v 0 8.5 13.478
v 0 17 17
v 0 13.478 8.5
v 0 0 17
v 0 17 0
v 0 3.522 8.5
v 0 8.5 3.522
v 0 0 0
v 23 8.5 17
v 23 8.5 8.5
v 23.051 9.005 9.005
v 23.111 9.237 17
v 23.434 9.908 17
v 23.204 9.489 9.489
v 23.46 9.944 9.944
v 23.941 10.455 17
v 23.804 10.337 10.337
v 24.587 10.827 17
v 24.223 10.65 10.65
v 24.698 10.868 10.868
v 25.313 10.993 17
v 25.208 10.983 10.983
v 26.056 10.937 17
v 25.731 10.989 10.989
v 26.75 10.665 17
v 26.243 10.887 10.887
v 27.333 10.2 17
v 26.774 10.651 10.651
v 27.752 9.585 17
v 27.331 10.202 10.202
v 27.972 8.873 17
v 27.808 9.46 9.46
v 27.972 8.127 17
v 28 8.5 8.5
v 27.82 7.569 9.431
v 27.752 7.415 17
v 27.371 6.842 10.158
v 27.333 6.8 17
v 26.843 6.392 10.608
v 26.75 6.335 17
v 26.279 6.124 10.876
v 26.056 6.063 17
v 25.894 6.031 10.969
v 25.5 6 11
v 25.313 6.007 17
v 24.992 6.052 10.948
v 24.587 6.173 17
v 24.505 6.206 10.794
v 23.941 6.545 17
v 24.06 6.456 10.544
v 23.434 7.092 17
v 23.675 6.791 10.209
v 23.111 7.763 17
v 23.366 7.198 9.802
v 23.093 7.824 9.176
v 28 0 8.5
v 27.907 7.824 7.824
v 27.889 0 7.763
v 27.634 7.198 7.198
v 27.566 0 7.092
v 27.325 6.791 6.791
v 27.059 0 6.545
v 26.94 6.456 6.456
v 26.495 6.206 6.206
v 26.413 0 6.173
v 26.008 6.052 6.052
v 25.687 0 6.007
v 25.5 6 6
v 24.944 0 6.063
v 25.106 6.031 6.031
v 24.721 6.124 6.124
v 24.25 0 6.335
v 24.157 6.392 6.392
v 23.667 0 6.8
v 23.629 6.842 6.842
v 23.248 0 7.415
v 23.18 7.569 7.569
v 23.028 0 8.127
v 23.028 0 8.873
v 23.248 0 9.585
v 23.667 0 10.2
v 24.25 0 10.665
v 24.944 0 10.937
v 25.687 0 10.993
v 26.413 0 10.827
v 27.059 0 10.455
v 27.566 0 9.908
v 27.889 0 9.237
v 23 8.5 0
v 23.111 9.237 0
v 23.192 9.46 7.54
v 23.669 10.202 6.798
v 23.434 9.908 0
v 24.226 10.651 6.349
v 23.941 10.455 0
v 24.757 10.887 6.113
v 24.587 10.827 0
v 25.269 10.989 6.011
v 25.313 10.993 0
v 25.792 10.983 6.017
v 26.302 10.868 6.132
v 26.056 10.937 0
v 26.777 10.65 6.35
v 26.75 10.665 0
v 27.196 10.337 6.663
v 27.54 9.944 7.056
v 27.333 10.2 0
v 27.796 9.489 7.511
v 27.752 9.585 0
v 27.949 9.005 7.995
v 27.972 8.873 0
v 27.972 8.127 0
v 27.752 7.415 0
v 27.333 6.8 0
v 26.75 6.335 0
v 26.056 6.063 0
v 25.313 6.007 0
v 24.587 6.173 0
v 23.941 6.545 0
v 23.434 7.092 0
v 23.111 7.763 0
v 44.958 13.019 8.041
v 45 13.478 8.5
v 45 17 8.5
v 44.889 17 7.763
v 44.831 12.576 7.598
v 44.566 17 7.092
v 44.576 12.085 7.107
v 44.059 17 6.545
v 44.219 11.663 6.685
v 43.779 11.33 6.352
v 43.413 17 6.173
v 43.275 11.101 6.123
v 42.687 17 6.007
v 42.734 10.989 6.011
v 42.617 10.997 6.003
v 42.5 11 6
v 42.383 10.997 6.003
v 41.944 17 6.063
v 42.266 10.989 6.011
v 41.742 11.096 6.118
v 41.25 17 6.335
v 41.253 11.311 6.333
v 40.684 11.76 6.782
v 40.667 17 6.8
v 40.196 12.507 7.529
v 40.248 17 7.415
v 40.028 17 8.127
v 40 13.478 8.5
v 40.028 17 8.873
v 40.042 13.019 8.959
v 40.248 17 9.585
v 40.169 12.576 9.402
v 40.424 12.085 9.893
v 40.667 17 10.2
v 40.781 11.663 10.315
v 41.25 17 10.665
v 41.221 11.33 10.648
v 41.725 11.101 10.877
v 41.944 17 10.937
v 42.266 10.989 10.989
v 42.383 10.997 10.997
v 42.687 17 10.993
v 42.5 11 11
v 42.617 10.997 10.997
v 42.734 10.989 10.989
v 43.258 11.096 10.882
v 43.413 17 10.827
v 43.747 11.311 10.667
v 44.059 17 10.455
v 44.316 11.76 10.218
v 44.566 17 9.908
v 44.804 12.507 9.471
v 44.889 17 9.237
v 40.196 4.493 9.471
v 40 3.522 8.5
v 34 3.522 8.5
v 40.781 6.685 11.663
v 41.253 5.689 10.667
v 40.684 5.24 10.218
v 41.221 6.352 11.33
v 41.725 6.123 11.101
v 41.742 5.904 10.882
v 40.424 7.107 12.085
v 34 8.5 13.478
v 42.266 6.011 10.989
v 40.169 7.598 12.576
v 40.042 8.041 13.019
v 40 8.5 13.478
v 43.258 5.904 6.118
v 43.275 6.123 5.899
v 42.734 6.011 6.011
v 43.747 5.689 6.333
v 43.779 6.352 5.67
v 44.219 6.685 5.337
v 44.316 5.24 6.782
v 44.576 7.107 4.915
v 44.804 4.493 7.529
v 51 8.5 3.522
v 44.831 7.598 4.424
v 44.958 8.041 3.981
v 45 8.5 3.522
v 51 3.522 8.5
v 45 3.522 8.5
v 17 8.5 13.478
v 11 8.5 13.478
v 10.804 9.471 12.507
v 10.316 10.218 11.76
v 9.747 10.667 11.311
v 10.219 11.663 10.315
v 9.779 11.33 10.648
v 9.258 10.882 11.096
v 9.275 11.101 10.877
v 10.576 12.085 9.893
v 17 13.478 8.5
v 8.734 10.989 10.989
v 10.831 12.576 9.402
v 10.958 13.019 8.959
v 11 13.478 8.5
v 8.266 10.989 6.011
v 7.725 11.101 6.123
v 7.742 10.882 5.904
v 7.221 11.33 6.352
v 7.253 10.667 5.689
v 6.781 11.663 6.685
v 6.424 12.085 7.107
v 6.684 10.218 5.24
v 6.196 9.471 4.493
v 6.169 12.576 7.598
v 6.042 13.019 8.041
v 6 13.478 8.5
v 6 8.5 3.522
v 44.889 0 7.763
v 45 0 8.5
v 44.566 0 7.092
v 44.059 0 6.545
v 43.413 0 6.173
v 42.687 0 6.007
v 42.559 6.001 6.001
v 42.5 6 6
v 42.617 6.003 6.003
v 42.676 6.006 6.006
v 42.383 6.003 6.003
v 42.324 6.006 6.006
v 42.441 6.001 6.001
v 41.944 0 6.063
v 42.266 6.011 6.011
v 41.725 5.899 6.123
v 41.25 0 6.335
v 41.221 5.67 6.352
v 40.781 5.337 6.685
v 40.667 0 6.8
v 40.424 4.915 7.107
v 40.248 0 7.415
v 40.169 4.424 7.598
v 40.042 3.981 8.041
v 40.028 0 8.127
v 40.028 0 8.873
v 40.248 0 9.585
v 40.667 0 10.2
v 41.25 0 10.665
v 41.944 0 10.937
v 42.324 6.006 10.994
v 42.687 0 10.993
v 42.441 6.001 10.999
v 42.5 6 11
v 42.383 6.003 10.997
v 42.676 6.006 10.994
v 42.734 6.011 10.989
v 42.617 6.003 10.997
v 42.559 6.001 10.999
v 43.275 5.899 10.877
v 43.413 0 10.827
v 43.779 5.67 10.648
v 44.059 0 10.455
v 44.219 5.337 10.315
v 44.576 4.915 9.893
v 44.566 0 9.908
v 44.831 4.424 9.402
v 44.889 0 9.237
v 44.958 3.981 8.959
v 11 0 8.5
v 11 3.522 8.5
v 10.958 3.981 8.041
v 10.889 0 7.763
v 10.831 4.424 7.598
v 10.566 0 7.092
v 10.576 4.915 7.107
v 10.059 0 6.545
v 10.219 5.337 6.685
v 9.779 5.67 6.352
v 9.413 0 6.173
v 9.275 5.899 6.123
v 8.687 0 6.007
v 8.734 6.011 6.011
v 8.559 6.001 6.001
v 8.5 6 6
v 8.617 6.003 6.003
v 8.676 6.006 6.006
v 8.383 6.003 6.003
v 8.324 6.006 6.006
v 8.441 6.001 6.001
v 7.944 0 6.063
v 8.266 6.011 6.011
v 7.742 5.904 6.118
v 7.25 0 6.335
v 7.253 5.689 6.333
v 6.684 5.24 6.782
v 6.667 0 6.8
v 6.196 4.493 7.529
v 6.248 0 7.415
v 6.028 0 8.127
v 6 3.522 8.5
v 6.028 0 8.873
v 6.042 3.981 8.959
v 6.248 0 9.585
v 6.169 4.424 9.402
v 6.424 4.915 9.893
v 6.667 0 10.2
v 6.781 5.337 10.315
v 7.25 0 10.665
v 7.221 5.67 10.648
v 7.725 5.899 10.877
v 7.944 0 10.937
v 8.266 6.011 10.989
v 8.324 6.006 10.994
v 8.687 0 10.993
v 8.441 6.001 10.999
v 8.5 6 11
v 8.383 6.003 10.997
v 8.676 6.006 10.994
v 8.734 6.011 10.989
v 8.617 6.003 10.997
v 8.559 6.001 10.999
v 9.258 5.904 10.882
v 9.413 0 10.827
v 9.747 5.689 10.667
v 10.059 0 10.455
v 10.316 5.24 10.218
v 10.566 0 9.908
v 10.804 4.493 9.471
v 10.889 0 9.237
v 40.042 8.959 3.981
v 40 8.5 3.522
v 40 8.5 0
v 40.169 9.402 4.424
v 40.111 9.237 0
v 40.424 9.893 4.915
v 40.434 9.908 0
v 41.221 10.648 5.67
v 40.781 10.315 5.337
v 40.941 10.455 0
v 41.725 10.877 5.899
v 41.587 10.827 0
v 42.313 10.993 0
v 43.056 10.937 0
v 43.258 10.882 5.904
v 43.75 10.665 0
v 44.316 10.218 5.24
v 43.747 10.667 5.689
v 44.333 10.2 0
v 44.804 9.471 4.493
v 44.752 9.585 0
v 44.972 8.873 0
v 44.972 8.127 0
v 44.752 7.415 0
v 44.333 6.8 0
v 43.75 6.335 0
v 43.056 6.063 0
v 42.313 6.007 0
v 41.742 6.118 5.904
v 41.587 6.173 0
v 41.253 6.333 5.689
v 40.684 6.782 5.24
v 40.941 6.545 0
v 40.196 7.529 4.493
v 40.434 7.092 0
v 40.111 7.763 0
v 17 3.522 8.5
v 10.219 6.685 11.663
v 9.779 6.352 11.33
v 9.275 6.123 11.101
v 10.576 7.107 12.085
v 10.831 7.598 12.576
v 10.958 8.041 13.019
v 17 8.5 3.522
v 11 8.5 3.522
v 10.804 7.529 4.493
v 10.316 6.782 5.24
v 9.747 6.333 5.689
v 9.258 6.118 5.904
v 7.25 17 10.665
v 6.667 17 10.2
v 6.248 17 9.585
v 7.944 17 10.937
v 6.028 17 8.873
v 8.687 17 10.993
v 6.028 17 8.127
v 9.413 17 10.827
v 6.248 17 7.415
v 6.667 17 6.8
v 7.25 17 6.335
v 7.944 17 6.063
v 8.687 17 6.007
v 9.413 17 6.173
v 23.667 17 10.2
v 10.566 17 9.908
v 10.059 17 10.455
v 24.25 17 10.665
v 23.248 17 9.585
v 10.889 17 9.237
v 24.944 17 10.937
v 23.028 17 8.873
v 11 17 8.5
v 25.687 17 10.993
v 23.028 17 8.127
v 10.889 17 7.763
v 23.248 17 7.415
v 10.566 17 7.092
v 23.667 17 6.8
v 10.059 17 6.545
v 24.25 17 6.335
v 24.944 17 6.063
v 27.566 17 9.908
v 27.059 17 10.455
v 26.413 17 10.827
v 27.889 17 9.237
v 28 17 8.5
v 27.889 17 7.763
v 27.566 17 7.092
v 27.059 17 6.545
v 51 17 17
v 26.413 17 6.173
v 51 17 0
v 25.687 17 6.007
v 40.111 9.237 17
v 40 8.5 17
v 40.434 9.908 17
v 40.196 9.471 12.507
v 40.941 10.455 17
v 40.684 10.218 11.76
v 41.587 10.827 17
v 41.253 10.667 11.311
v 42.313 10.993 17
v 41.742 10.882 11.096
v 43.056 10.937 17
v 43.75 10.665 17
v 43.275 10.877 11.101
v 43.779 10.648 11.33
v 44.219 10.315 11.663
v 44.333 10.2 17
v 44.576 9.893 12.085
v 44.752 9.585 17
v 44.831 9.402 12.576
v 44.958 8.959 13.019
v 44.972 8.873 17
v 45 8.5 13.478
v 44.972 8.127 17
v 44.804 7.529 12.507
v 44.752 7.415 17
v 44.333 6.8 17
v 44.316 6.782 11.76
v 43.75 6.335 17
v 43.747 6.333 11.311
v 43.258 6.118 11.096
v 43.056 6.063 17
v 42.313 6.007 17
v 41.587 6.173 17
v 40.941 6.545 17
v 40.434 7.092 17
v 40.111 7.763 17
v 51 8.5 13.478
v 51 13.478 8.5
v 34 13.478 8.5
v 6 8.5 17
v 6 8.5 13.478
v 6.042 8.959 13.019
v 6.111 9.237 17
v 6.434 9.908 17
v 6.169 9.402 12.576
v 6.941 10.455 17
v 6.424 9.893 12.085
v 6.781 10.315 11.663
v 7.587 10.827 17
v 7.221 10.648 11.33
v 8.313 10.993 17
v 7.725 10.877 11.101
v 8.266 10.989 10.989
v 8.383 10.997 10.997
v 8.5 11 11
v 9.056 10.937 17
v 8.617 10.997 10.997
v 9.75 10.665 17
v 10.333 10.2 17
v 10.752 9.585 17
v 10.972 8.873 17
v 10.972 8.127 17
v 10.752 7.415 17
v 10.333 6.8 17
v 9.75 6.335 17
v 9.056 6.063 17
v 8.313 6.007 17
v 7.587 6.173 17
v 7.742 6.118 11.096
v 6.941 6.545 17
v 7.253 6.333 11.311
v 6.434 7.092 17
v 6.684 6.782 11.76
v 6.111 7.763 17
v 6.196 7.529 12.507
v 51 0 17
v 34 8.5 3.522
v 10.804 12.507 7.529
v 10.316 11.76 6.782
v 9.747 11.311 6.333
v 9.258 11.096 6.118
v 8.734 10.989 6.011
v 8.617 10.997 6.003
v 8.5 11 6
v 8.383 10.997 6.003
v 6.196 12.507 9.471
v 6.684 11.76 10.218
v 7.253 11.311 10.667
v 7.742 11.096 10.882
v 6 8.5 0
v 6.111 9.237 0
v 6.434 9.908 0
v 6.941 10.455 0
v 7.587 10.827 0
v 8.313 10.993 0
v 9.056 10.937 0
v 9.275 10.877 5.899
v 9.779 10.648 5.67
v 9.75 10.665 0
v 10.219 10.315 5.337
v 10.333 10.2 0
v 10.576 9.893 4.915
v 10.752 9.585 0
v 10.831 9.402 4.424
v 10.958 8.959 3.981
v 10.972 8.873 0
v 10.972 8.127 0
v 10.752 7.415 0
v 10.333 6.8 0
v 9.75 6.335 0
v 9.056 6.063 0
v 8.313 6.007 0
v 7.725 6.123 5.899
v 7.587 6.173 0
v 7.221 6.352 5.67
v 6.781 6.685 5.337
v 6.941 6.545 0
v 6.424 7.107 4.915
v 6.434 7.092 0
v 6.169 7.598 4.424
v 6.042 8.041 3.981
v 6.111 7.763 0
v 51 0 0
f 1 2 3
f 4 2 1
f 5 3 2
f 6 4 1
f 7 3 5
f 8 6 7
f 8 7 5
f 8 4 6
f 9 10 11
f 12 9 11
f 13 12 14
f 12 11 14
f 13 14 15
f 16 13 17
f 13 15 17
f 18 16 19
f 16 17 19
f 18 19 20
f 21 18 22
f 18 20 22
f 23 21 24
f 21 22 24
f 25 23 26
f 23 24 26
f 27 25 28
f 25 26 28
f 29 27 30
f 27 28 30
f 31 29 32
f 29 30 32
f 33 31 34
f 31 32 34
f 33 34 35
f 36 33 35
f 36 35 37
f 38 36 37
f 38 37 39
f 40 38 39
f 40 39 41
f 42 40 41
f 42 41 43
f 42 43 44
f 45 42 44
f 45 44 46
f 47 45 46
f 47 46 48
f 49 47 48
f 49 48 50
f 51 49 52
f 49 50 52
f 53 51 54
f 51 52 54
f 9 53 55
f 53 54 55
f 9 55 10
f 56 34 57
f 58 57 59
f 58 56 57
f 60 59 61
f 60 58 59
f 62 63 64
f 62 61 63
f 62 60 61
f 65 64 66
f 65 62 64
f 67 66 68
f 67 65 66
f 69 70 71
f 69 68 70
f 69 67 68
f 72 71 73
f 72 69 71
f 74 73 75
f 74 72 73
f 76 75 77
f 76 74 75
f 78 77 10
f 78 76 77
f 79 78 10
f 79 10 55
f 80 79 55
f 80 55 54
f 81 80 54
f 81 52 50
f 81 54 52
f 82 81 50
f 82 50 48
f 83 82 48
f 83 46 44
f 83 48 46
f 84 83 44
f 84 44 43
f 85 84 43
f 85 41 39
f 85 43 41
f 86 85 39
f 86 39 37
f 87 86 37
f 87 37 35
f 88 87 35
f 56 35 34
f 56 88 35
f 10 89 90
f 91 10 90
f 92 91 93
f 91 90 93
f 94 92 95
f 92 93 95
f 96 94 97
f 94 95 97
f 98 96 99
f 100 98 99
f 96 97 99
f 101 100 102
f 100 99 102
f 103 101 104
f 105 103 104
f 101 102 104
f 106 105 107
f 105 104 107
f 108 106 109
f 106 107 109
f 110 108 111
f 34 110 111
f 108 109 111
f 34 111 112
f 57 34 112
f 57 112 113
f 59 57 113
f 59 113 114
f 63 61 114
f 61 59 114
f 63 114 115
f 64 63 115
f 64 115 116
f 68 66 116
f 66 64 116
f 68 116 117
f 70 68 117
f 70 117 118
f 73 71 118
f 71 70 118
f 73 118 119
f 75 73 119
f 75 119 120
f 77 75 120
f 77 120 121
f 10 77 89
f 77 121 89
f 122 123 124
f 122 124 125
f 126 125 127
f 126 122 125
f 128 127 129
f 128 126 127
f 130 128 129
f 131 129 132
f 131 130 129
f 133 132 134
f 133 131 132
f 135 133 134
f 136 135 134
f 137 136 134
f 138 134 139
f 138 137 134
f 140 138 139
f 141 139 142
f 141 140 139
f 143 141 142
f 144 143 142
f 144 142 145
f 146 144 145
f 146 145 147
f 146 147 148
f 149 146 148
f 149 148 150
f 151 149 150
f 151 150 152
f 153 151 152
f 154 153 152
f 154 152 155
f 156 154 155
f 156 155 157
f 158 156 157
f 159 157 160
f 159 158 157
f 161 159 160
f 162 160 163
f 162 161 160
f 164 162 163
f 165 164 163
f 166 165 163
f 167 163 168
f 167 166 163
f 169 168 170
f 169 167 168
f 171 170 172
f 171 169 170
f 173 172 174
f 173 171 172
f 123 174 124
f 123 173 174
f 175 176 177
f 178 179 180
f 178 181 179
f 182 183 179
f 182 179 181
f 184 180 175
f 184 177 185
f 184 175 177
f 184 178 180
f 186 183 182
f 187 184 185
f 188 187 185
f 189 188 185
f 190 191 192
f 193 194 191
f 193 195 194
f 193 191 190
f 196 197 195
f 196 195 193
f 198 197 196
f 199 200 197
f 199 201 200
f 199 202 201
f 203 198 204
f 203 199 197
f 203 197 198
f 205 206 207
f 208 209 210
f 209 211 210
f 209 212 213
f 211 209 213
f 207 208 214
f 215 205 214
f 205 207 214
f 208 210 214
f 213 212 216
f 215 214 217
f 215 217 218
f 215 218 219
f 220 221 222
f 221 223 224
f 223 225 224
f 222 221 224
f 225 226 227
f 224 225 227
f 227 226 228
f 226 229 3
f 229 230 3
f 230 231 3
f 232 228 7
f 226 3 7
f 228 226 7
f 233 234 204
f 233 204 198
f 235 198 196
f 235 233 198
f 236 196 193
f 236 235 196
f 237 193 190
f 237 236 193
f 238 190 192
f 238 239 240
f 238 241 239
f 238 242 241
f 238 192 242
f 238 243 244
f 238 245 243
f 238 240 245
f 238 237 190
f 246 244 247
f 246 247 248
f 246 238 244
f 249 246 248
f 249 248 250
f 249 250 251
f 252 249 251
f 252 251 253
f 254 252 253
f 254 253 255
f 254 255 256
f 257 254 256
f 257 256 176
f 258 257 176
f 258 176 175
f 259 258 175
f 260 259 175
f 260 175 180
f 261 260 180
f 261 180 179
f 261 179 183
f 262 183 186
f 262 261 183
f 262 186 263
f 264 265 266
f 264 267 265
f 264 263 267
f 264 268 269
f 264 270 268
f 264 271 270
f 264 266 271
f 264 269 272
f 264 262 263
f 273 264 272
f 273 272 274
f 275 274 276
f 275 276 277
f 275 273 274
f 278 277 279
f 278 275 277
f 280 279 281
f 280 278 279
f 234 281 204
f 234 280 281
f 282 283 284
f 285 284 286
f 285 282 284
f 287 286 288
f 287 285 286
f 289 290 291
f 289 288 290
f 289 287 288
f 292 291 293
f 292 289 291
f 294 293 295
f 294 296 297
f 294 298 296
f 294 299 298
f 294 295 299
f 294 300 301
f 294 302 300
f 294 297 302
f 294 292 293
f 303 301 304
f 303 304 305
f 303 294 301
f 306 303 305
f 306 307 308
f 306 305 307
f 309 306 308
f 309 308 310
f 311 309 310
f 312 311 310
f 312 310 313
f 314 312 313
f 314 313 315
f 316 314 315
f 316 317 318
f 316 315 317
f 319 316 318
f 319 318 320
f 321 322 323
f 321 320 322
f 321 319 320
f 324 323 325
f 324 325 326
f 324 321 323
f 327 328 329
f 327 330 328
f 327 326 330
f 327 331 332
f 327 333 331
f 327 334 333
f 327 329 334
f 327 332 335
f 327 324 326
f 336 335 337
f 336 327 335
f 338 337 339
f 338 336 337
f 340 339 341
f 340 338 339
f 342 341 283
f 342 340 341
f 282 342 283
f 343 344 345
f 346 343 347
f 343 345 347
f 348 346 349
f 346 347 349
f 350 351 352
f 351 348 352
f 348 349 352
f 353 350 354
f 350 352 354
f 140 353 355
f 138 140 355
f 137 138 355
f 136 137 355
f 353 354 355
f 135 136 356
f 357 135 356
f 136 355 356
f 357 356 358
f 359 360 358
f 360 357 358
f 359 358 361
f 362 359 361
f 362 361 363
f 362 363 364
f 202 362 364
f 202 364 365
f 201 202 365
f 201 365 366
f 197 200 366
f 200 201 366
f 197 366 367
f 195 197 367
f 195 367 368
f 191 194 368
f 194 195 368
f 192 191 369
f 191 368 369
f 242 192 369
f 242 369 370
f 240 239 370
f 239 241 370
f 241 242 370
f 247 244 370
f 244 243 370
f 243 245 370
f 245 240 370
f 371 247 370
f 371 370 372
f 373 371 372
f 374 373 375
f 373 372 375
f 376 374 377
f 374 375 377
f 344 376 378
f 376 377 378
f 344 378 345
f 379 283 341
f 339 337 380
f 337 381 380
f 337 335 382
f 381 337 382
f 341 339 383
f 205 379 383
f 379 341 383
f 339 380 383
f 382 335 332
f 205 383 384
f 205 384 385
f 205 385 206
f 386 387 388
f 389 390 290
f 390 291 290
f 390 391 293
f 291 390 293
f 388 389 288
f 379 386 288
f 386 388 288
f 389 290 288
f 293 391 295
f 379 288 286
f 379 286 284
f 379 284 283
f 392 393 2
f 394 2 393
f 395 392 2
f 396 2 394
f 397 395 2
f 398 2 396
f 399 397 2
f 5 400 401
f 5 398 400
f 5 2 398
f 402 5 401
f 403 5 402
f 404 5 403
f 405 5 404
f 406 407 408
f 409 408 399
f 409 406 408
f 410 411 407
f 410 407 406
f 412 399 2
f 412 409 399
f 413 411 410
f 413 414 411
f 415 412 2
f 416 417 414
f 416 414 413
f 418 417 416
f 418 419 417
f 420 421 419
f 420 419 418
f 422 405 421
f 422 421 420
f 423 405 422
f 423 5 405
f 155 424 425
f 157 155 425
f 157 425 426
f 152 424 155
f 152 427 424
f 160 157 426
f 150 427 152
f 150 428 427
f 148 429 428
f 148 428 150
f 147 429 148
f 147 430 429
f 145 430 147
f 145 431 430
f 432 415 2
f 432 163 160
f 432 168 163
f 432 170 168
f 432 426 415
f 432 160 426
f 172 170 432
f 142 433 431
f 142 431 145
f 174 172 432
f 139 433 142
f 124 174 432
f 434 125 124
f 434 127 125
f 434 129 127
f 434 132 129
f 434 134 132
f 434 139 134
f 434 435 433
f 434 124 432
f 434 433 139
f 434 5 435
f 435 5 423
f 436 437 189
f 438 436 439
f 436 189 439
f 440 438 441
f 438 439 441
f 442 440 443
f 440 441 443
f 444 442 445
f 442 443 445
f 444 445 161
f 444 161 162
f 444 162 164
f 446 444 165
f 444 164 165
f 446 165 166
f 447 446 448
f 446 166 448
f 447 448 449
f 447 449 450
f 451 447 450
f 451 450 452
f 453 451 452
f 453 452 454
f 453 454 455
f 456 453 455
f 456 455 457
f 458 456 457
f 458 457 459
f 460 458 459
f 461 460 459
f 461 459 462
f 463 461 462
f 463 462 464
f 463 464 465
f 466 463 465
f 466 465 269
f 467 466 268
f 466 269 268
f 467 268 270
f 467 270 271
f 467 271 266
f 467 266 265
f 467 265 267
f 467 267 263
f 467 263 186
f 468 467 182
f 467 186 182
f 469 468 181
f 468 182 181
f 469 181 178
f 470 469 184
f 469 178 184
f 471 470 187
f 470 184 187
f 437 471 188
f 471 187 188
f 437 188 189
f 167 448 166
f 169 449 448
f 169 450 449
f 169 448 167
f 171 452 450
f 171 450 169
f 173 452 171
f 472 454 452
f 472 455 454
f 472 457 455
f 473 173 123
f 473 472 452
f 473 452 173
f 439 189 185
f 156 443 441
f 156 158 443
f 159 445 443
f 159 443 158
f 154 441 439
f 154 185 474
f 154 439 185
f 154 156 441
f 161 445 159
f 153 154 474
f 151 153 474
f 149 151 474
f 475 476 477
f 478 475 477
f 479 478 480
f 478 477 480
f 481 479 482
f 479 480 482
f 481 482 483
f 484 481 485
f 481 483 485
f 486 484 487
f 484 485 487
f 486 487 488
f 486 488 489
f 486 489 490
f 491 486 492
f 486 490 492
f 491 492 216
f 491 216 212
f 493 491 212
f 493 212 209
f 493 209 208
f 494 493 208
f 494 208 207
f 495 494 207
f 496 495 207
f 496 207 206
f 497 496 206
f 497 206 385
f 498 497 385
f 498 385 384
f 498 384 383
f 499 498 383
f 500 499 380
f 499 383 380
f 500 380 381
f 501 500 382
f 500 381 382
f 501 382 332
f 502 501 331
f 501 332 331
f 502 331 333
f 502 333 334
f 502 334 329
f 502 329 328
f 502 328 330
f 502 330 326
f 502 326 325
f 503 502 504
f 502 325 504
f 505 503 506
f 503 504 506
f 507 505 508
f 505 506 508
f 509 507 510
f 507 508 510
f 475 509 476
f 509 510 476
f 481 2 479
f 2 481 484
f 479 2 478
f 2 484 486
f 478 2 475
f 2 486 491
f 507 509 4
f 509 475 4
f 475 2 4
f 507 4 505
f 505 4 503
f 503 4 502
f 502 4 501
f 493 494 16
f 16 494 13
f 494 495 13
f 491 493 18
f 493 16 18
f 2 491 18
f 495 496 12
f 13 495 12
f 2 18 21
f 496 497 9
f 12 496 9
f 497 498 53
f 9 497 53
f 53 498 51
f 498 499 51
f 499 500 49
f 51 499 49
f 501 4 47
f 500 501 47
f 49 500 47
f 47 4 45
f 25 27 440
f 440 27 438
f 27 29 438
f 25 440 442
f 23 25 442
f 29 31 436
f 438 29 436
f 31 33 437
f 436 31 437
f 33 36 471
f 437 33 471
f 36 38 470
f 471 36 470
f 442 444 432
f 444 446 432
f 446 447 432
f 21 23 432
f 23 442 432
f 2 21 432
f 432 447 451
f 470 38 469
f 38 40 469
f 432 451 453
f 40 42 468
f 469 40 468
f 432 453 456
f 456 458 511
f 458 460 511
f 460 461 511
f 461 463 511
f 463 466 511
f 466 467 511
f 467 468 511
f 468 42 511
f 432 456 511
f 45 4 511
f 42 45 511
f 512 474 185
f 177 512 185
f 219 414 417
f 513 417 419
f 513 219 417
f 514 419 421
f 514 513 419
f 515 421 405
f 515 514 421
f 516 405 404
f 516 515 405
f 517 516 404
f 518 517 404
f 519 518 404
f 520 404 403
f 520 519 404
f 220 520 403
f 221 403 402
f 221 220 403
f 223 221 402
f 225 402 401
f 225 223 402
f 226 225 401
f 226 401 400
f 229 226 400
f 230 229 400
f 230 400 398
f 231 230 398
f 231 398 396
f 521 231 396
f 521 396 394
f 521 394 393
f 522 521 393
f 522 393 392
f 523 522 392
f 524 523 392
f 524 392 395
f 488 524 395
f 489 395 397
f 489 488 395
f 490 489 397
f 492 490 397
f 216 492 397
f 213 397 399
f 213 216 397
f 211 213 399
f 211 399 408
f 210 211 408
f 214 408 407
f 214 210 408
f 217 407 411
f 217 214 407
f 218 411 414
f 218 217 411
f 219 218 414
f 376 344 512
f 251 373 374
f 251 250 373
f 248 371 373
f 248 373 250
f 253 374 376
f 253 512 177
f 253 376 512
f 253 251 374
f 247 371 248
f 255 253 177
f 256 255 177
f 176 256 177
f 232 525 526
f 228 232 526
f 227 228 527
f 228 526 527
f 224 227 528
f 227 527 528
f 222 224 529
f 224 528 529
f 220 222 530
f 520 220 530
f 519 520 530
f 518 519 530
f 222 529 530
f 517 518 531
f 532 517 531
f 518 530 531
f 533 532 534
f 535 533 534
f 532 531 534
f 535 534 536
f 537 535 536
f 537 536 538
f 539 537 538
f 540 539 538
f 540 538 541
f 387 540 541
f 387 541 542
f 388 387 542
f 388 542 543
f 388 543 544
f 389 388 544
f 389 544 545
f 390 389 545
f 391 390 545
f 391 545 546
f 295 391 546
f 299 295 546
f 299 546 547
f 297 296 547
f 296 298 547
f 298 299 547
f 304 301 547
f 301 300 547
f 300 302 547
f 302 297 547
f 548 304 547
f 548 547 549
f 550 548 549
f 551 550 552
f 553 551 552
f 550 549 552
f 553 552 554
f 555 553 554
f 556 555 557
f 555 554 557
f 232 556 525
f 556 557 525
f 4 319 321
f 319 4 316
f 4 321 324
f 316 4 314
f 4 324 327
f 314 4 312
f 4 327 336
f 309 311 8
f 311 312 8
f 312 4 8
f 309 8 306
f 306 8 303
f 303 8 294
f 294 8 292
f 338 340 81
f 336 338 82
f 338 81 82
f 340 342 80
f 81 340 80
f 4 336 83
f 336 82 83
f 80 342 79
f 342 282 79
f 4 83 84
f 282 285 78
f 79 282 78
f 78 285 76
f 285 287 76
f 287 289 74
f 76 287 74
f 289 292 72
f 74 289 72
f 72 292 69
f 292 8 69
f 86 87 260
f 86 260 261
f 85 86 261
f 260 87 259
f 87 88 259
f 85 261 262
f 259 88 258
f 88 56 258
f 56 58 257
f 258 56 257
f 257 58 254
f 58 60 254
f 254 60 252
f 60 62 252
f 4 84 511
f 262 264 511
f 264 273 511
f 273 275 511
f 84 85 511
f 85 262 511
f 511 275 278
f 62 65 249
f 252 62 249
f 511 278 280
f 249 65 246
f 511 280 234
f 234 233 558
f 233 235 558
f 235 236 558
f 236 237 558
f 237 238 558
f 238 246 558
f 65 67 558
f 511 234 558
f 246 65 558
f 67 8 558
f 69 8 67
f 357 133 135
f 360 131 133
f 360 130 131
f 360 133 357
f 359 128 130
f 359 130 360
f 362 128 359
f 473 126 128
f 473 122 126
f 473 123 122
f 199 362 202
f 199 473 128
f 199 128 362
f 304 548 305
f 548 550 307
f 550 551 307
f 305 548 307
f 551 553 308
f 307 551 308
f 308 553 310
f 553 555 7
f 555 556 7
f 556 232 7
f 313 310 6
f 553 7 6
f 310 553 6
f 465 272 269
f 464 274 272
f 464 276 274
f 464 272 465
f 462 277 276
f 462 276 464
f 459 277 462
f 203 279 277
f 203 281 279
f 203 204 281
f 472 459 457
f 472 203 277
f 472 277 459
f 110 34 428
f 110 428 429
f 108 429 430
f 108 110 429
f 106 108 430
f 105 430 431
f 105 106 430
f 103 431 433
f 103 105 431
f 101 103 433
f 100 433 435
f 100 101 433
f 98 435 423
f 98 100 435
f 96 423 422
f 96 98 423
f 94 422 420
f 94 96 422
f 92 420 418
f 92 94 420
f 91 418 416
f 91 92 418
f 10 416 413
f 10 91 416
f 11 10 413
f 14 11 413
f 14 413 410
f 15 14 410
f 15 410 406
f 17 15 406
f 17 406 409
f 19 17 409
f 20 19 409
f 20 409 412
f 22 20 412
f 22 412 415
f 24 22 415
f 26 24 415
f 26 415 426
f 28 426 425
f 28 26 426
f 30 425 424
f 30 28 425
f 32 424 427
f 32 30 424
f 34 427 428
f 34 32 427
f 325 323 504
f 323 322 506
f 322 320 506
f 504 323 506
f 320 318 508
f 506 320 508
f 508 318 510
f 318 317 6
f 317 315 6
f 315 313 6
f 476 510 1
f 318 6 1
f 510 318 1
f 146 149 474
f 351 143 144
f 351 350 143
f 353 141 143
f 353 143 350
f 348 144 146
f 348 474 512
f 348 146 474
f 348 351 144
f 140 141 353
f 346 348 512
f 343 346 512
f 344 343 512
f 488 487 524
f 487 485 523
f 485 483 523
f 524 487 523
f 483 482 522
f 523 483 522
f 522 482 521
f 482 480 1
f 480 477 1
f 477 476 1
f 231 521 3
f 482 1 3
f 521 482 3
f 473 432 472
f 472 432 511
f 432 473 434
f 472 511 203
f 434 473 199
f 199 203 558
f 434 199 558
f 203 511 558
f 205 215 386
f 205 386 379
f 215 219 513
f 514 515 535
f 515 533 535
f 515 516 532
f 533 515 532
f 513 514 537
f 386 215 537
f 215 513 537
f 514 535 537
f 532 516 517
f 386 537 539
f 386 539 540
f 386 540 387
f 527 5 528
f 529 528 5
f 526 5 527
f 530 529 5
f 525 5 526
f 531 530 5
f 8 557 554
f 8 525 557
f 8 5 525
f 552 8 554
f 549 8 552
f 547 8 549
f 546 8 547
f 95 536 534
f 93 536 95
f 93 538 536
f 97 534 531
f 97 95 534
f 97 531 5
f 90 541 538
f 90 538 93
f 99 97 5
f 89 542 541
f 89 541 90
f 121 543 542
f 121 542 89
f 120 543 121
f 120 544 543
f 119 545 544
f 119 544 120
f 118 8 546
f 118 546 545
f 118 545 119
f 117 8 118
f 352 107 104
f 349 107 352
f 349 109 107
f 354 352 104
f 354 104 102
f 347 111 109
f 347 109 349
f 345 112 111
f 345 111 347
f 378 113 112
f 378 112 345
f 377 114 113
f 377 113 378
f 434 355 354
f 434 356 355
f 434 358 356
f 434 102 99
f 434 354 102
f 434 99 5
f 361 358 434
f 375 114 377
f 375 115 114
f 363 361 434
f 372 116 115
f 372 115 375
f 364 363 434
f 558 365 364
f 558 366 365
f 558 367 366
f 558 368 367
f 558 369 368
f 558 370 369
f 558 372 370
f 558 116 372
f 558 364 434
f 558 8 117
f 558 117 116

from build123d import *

# Parameters (mm, degrees)
SKETCH1_W           = 51
SKETCH1_H           = 17
SKETCH1_R           = 2.5
BOSS_EXTRUDE1_DEPTH = 17
SKETCH6_OUTSIDE_W   = 64.276
SKETCH6_OUTSIDE_H   = 30.276
SKETCH6_OUTSIDE_W_2 = 51
SKETCH6_OUTSIDE_H_2 = 17
SKETCH6_OUTSIDE_R   = 2.5
CUT_EXTRUDE10_DEPTH = 18
SKETCH7_OUTSIDE_W   = 30.276
SKETCH7_OUTSIDE_H   = 30.276
SKETCH7_OUTSIDE_W_2 = 17
SKETCH7_OUTSIDE_H_2 = 17
CUT_EXTRUDE11_DEPTH = 17
SKETCH9_OUTSIDE_W   = 30.276
SKETCH9_OUTSIDE_H   = 30.276
SKETCH9_OUTSIDE_W_2 = 17
SKETCH9_OUTSIDE_H_2 = 17
CUT_EXTRUDE12_DEPTH = 17


with BuildPart() as part:
    # sketch1 → Boss-Extrude1 (new body)
    with BuildSketch(Plane(origin=(0, 0, 0), x_dir=(1, 0, 0), z_dir=(0, 1, 0))):
        with Locations((25.5, -8.5)):
            Rectangle(SKETCH1_W, SKETCH1_H)
        with Locations((8.5, -8.5)):
            Circle(SKETCH1_R, mode=Mode.SUBTRACT)
        with Locations((25.5, -8.5)):
            Circle(SKETCH1_R, mode=Mode.SUBTRACT)
        with Locations((42.5, -8.5)):
            Circle(SKETCH1_R, mode=Mode.SUBTRACT)
    extrude(amount=BOSS_EXTRUDE1_DEPTH)

    # Sketch6 outside → Cut-Extrude10 (cut, through all)
    with BuildSketch(Plane(origin=(0, 0, 0), x_dir=(-1, 0, 0), z_dir=(0, 0, -1))):
        with Locations((-25.5, 8.5)):
            Rectangle(SKETCH6_OUTSIDE_W, SKETCH6_OUTSIDE_H)
        with Locations((-25.5, 8.5)):
            Rectangle(SKETCH6_OUTSIDE_W_2, SKETCH6_OUTSIDE_H_2, mode=Mode.SUBTRACT)
        with Locations((-42.5, 8.5)):
            Circle(SKETCH6_OUTSIDE_R)
        with Locations((-25.5, 8.5)):
            Circle(SKETCH6_OUTSIDE_R)
        with Locations((-8.5, 8.5)):
            Circle(SKETCH6_OUTSIDE_R)
    extrude(amount=-CUT_EXTRUDE10_DEPTH, mode=Mode.SUBTRACT)

    # Sketch7 outside → Cut-Extrude11 (cut)
    with BuildSketch(Plane(origin=(51, 0, 0), x_dir=(0, 0, -1), z_dir=(1, 0, 0))):
        with Locations((-8.5, 8.5)):
            Rectangle(SKETCH7_OUTSIDE_W, SKETCH7_OUTSIDE_H)
        with Locations((-8.5, 8.5)):
            Rectangle(SKETCH7_OUTSIDE_W_2, SKETCH7_OUTSIDE_H_2, mode=Mode.SUBTRACT)
        Polygon((-8.5, 13.47803174), (-3.52196826, 8.5), (-8.5, 3.52196826), (-13.47803174, 8.5), align=None)
    extrude(amount=-CUT_EXTRUDE11_DEPTH, mode=Mode.SUBTRACT)

    # Sketch9 outside → Cut-Extrude12 (cut)
    with BuildSketch(Plane.ZY):
        with Locations((8.5, 8.5)):
            Rectangle(SKETCH9_OUTSIDE_W, SKETCH9_OUTSIDE_H)
        with Locations((8.5, 8.5)):
            Rectangle(SKETCH9_OUTSIDE_W_2, SKETCH9_OUTSIDE_H_2, mode=Mode.SUBTRACT)
        Polygon((8.5, 13.47803174), (3.52196826, 8.5), (8.5, 3.52196826), (13.47803174, 8.5), align=None)
    extrude(amount=-CUT_EXTRUDE12_DEPTH, mode=Mode.SUBTRACT)


solid = part.part
